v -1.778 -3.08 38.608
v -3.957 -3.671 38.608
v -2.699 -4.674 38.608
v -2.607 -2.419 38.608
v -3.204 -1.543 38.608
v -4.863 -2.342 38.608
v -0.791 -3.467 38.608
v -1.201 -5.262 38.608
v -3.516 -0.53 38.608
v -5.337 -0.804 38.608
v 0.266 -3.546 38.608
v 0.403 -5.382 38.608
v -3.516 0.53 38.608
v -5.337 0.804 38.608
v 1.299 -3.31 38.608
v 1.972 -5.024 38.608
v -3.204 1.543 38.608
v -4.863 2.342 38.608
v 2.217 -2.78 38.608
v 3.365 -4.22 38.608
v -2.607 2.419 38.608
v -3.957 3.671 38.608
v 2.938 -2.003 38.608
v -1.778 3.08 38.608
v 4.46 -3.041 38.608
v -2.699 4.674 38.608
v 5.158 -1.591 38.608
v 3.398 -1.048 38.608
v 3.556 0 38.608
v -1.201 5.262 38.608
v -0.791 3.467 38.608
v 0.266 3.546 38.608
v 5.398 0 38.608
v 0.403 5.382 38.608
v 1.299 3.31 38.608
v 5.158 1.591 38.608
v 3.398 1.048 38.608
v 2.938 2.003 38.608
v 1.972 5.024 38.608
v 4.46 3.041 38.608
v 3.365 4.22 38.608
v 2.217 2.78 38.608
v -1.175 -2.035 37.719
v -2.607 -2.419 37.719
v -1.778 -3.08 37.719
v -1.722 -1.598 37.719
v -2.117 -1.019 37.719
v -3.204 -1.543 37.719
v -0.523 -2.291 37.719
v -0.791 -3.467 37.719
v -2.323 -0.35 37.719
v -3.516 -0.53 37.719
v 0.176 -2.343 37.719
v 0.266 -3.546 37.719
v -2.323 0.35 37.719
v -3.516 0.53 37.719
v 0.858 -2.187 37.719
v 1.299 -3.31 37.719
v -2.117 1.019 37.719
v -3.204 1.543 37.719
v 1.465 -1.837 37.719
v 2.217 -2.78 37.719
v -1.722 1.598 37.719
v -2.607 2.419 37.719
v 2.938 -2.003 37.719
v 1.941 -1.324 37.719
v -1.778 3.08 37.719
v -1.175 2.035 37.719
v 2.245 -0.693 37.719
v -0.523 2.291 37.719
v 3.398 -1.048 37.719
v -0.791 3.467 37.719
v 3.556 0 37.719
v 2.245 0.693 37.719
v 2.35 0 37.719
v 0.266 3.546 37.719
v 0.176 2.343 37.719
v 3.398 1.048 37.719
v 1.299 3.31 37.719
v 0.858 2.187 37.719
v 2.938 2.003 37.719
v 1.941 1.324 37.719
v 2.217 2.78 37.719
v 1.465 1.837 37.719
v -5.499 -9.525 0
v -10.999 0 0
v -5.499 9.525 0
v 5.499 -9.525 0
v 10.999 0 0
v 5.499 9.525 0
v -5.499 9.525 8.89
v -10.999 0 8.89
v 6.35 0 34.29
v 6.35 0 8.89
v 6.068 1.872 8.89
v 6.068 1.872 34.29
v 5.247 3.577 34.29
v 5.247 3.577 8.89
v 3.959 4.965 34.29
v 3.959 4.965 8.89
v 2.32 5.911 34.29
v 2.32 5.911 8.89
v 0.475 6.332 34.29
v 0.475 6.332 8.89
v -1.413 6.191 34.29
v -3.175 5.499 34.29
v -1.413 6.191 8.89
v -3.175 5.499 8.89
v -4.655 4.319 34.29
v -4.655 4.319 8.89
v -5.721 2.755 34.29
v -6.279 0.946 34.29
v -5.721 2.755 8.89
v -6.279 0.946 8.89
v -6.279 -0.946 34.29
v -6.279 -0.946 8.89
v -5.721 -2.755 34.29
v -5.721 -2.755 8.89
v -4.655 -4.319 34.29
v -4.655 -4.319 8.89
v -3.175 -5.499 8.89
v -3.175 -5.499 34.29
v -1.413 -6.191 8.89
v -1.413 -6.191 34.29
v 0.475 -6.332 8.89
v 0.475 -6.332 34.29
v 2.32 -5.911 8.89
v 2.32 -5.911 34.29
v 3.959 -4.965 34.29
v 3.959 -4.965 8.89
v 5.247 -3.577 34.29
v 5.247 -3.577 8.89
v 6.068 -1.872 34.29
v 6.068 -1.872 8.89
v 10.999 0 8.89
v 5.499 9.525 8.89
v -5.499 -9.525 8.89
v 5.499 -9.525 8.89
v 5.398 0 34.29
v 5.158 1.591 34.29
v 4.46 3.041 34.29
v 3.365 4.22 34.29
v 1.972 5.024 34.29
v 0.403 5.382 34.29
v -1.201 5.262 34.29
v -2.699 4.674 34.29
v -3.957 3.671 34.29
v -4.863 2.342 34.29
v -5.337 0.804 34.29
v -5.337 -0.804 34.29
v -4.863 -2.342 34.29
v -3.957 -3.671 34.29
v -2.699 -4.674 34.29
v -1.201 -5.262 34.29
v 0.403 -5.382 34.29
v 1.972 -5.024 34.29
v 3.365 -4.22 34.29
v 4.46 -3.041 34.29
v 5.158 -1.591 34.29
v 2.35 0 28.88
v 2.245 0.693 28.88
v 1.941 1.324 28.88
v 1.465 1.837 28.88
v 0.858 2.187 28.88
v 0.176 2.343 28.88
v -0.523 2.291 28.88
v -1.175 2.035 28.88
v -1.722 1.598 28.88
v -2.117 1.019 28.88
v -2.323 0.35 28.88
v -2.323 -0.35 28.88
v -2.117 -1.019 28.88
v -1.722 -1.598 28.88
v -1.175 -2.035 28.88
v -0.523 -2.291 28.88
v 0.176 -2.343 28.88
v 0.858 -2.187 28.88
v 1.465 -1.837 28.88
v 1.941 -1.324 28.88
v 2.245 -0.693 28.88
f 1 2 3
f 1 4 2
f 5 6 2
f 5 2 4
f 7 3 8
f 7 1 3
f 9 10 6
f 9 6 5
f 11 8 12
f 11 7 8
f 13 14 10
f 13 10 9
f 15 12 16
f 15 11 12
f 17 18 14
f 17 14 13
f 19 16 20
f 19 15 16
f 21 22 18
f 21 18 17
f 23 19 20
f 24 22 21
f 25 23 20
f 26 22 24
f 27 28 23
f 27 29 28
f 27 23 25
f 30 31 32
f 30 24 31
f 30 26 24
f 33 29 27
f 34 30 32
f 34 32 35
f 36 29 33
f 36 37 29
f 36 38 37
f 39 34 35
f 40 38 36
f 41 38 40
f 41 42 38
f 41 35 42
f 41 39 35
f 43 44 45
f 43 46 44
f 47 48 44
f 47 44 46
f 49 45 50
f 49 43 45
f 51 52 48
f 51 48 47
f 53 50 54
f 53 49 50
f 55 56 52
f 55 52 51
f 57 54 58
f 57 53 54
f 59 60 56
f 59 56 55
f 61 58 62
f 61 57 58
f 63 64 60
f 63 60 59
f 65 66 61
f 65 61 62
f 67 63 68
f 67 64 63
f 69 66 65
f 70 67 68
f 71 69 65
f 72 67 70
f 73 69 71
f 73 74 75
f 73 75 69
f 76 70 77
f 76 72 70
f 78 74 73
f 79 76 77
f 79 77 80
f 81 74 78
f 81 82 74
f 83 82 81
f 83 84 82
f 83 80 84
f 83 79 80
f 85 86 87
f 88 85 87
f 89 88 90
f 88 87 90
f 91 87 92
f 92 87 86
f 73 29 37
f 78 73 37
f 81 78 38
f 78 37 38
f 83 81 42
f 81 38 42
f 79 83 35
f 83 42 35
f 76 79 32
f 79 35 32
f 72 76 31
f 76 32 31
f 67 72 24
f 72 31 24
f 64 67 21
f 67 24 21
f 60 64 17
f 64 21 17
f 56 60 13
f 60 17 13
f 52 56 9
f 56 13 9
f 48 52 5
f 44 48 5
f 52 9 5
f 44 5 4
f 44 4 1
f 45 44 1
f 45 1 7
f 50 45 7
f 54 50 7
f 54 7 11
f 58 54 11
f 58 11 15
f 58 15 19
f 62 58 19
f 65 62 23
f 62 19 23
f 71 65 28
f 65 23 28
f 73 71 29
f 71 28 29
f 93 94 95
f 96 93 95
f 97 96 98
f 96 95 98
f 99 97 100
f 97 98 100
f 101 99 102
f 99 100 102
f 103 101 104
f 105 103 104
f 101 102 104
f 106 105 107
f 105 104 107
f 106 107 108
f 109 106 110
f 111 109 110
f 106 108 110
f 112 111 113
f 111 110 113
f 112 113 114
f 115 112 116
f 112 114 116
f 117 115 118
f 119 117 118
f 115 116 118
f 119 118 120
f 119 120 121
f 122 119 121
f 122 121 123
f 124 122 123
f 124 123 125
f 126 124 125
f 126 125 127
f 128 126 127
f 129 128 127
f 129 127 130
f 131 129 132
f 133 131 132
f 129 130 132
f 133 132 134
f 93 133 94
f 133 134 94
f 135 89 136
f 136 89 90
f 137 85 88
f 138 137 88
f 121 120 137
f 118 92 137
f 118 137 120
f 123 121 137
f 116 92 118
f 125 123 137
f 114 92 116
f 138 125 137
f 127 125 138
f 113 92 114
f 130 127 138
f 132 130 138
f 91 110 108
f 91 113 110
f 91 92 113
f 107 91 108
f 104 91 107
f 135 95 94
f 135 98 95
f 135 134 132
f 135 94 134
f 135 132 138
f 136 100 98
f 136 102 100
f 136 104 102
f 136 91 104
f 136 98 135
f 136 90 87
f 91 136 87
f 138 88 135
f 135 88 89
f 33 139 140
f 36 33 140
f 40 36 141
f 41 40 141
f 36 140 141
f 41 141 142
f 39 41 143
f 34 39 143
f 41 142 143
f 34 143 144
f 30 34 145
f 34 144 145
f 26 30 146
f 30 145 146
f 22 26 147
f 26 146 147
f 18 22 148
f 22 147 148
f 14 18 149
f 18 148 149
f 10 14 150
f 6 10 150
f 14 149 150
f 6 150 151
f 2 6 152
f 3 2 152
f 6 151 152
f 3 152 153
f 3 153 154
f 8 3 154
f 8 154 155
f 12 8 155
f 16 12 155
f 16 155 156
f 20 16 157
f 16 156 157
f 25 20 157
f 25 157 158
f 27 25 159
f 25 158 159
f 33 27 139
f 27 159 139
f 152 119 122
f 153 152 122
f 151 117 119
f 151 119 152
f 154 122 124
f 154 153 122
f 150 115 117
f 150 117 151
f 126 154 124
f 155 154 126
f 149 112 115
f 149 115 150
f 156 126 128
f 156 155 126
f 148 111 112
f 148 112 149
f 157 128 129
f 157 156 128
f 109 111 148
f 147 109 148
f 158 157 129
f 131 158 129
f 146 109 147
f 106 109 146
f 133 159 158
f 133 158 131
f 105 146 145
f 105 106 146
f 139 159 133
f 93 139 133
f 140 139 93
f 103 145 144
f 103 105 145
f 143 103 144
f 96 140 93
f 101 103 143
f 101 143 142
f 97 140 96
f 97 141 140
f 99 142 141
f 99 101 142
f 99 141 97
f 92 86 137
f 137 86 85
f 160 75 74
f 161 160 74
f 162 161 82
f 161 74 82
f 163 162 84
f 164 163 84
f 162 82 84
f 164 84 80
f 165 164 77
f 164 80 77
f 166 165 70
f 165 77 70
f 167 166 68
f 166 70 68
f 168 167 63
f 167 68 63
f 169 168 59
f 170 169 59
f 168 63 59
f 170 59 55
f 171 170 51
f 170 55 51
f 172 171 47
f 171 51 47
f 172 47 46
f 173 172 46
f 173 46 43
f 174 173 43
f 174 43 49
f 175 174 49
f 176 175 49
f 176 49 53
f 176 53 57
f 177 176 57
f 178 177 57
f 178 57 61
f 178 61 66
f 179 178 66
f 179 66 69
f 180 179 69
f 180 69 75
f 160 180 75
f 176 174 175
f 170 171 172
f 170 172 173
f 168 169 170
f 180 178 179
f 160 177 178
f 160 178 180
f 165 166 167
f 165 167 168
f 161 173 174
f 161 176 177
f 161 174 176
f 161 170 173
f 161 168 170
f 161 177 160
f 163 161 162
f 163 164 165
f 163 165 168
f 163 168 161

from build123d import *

# Parameters (mm, degrees)
F6_DEPTH  = 8.89
F7_R      = 6.35
F8_DEPTH  = 25.4
F9_R      = 5.3975
F10_DEPTH = 4.318
F11_R     = 3.556
F12_DEPTH = 0.889
F13_R     = 2.3495
F14_DEPTH = 9.7282


# Not quite as in the source:
# - a variable given as a bare number and used for a length is read in inches; the dataset says mm whatever the document's units were


with BuildPart() as f6:
    # F5 (on Top) → F6 (new body)
    with BuildSketch(Plane.XY):
        Polygon((5.499261314, 9.525), (-5.499261314, 9.525), (-10.9985226281, 0), (-5.499261314, -9.525), (5.499261314, -9.525), (10.9985226281, 0), align=None)
    extrude(amount=F6_DEPTH)

    # F7 (on face) → F8 (join)
    with BuildSketch(Plane.XY.offset(8.89)):
        Circle(F7_R)
    extrude(amount=F8_DEPTH)

    # F9 (on face) → F10 (join)
    with BuildSketch(Plane.XY.offset(34.29)):
        Circle(F9_R)
    extrude(amount=F10_DEPTH)

    # F11 (on face) → F12 (cut)
    with BuildSketch(Plane.XY.offset(38.608)):
        Circle(F11_R)
    extrude(amount=-F12_DEPTH, mode=Mode.SUBTRACT)

    # F13 (on face) → F14 (cut)
    with BuildSketch(Plane.XY.offset(38.608)):
        Circle(F13_R)
    extrude(amount=-F14_DEPTH, mode=Mode.SUBTRACT)


solid = f6.part
